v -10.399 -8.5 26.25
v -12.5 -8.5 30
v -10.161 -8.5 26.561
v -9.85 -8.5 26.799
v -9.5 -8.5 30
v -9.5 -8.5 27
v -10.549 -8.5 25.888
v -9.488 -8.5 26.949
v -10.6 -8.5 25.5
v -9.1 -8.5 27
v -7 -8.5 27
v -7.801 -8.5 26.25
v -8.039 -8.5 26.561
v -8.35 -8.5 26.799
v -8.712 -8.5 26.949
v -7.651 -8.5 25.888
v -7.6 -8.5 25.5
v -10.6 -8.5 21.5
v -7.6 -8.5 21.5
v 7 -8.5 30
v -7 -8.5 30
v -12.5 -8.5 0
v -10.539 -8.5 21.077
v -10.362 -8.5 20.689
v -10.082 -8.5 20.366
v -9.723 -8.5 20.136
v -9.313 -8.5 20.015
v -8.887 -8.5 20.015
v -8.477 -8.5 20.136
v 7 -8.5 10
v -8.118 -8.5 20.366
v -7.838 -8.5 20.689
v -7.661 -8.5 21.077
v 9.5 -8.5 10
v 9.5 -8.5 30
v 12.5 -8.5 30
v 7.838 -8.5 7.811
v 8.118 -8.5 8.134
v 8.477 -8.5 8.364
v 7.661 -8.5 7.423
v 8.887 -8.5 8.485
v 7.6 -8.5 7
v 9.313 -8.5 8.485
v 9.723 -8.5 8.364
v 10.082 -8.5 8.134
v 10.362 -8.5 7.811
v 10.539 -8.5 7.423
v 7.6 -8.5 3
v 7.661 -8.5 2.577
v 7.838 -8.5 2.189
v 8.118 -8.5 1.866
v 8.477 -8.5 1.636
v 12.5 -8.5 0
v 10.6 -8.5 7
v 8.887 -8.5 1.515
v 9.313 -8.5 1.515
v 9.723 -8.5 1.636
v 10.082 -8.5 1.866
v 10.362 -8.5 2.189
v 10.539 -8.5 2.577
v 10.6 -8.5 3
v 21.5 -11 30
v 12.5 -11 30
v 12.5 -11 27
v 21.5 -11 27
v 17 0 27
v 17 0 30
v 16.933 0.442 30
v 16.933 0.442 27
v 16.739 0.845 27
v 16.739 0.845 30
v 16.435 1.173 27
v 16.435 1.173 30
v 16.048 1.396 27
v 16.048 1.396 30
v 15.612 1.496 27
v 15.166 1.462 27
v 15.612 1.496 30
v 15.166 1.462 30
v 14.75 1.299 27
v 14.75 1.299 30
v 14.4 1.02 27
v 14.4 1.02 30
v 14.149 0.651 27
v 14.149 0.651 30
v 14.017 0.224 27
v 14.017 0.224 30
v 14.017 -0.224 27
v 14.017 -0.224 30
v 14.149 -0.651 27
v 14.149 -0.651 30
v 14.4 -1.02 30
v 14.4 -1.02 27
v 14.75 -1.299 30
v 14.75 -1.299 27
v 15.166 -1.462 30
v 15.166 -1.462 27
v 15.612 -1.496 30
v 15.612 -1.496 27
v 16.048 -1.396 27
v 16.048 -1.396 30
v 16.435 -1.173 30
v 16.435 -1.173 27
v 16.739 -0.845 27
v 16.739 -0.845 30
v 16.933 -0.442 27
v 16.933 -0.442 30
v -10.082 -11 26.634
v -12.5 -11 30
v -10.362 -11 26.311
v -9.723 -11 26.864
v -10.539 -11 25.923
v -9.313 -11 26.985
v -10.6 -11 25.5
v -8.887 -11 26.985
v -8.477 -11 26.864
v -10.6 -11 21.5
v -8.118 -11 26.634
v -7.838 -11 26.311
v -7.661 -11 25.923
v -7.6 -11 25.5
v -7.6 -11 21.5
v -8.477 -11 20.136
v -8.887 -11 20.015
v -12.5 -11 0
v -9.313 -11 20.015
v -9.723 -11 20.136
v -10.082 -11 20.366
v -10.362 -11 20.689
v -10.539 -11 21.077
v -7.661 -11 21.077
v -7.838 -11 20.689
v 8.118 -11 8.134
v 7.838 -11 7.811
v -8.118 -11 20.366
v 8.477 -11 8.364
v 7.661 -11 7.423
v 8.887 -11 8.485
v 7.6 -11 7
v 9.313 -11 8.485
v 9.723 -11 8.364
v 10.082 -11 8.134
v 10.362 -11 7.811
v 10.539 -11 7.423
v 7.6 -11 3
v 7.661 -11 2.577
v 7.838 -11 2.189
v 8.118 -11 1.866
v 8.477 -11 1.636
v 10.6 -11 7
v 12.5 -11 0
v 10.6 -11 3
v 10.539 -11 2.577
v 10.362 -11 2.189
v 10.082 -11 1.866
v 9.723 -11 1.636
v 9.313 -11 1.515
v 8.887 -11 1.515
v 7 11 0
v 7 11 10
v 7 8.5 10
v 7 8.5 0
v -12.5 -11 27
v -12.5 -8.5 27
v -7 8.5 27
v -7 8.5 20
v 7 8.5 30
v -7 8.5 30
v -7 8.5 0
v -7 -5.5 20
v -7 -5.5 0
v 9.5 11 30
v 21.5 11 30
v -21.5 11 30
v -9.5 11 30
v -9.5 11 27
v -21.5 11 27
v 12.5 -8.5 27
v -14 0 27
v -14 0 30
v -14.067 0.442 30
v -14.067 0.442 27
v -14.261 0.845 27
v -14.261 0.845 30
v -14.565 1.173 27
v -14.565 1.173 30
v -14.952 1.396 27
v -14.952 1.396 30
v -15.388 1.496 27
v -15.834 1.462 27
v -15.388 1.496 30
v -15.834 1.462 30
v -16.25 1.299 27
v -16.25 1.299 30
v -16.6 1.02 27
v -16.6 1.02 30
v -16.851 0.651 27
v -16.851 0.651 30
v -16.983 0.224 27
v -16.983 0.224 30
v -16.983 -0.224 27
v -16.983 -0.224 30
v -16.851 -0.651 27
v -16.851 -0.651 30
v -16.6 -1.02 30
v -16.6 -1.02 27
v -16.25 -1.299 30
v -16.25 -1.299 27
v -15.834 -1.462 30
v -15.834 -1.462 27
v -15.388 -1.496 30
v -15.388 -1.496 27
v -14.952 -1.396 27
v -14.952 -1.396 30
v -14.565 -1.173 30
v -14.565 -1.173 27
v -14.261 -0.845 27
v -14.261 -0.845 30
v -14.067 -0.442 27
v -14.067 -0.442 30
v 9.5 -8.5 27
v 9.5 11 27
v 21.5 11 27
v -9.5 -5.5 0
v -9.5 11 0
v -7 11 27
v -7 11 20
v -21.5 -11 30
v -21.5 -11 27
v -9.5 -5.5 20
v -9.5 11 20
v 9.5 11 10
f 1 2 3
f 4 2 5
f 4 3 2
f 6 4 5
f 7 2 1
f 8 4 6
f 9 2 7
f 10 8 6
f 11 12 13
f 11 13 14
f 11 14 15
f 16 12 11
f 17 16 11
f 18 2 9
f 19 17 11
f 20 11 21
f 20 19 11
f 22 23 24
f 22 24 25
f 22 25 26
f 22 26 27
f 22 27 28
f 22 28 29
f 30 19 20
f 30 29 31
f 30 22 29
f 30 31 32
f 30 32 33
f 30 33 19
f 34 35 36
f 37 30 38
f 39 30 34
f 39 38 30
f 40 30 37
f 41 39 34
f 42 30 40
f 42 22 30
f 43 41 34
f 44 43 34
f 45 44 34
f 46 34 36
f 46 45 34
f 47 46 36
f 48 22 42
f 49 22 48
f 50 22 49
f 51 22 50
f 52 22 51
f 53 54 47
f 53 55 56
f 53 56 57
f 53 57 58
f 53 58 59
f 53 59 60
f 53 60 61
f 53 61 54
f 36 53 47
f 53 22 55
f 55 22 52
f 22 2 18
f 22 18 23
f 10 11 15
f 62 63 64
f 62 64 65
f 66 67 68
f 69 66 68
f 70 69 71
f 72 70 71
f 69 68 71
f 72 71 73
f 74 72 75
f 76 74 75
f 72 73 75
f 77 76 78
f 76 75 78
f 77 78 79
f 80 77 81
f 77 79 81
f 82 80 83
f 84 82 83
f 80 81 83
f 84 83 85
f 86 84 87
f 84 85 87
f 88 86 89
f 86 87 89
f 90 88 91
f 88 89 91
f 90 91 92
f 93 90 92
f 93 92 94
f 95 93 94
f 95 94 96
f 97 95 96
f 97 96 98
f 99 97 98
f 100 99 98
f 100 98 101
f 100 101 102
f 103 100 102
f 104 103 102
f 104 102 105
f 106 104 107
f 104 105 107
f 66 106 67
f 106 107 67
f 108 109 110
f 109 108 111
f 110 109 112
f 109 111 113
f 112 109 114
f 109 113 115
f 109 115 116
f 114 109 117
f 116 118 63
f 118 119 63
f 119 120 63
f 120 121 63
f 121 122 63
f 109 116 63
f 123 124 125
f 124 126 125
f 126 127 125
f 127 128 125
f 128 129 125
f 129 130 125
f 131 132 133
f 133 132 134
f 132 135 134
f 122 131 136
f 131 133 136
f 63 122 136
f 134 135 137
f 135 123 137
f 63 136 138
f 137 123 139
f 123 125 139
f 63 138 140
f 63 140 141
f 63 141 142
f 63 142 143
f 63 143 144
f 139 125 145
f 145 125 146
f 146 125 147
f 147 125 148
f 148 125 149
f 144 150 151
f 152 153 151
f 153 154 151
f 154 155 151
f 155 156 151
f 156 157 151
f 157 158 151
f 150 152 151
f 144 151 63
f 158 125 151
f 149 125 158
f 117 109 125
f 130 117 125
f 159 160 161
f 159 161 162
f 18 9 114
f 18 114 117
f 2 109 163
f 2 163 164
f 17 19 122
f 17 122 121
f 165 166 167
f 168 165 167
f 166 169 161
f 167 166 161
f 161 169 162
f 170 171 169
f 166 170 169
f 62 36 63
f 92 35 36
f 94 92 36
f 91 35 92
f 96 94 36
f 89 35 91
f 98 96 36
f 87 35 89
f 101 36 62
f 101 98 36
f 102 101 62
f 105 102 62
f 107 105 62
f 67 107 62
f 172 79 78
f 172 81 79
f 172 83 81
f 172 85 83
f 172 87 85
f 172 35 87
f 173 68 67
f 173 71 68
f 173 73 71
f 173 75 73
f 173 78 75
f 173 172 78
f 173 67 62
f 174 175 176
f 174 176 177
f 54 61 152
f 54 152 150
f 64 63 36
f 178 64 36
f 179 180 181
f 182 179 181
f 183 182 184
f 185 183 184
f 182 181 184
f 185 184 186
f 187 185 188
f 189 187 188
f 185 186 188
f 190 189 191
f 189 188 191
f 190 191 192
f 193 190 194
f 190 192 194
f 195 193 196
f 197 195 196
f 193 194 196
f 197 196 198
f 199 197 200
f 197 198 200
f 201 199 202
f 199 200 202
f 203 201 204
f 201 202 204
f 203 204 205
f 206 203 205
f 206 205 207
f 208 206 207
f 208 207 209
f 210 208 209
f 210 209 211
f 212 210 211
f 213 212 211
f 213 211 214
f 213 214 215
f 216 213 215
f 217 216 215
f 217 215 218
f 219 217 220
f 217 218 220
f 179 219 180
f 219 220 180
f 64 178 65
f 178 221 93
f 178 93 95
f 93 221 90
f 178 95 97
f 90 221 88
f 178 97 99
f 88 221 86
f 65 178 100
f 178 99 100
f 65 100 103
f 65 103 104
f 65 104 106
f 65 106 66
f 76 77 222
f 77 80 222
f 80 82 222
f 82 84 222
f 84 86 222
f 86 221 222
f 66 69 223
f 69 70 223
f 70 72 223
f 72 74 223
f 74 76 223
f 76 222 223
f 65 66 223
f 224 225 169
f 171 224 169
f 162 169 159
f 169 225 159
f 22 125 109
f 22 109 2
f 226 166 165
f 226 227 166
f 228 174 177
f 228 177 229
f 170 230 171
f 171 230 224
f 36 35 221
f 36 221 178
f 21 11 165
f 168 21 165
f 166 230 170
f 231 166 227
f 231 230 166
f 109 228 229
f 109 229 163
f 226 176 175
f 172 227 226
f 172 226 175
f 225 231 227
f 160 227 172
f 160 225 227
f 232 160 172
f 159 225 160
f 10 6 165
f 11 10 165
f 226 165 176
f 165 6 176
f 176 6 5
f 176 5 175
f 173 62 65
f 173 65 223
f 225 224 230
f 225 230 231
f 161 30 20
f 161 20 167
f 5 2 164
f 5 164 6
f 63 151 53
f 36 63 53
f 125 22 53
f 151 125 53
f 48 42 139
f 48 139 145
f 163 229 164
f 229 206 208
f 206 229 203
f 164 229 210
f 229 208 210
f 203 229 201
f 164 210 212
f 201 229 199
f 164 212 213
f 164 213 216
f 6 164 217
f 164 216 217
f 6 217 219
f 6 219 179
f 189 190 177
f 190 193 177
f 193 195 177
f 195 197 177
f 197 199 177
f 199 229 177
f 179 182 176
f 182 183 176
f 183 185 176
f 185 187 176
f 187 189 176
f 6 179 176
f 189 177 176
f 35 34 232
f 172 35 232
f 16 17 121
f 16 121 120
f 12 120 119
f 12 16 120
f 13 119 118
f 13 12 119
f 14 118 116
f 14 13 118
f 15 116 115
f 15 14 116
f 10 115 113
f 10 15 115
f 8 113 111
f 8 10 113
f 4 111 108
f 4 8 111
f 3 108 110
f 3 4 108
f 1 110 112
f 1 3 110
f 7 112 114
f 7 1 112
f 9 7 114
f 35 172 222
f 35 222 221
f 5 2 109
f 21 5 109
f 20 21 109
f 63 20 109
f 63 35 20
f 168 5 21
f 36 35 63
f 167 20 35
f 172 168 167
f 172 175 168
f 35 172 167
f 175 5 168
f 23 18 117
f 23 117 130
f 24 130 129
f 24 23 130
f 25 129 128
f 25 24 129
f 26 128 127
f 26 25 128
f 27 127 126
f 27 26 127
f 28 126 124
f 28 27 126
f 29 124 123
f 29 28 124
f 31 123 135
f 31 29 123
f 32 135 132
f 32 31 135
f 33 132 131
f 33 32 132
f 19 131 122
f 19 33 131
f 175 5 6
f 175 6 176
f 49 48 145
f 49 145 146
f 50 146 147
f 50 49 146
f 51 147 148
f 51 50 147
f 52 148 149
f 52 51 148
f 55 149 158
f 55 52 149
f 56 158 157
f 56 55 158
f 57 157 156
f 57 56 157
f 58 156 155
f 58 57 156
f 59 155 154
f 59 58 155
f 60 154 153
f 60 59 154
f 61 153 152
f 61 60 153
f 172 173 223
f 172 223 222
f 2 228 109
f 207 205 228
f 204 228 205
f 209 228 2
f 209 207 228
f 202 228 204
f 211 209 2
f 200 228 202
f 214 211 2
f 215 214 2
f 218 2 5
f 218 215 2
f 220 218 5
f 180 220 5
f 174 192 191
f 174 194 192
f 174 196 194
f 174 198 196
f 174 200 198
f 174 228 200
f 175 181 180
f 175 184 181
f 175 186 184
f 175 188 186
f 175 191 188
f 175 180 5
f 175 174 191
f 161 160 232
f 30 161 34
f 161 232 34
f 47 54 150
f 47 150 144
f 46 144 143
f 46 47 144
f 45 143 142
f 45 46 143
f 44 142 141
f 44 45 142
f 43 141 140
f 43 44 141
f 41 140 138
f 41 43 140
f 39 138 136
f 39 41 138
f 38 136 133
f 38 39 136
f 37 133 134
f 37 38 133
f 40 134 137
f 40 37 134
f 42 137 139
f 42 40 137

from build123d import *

# Parameters (mm, degrees)
SKETCH1_W           = 19
SKETCH1_H           = 22
SKETCH1_W_2         = 14
SKETCH1_H_2         = 17
SKETCH1_W_3         = 3
SKETCH1_H_3         = 2.5
BOSS_EXTRUDE1_DEPTH = 30
SKETCH2_W           = 7
SKETCH2_H           = 16.5
CUT_EXTRUDE1_DEPTH  = 2.5
SKETCH3_W           = 10
SKETCH3_H           = 16.5
SKETCH3_H_2         = 3
CUT_EXTRUDE2_DEPTH  = 2.5
CUT_EXTRUDE3_DEPTH  = 38.901187316
SKETCH6_R           = 1.5
SKETCH6_W           = 9
SKETCH6_H           = 2.5
BOSS_EXTRUDE2_DEPTH = 3


with BuildPart() as part:
    # Sketch1 → Boss-Extrude1 (new body)
    # profile 1 of 3: a face of its own
    with BuildSketch(Plane.XY):
        Rectangle(SKETCH1_W, SKETCH1_H)
        Rectangle(SKETCH1_W_2, SKETCH1_H_2, mode=Mode.SUBTRACT)
    # profile 2 of 3: a face of its own
    with BuildSketch(Plane.XY):
        with Locations((-11, -9.75)):
            Rectangle(SKETCH1_W_3, SKETCH1_H_3)
    # profile 3 of 3: a face of its own
    with BuildSketch(Plane.XY):
        with Locations((11, -9.75)):
            Rectangle(SKETCH1_W_3, SKETCH1_H_3)
    extrude(amount=BOSS_EXTRUDE1_DEPTH)

    # Sketch2 → Cut-Extrude1 (cut)
    with BuildSketch(Plane.ZY.offset(9.5)):
        Polygon((27.000006, -8.5), (27.000006, -5.5), (20.000006, -5.5), (0, -5.5), (0, -8.5), align=None)
        with Locations((23.500006, 2.75)):
            Rectangle(SKETCH2_W, SKETCH2_H)
    extrude(amount=-CUT_EXTRUDE1_DEPTH, mode=Mode.SUBTRACT)

    # Sketch3 → Cut-Extrude2 (cut)
    with BuildSketch(Plane(origin=(9.5, 0, 0), x_dir=(0, 0, -1), z_dir=(1, 0, 0))):
        with Locations((-5, 2.75)):
            Rectangle(SKETCH3_W, SKETCH3_H)
        with Locations((-5, -7)):
            Rectangle(SKETCH3_W, SKETCH3_H_2)
    extrude(amount=-CUT_EXTRUDE2_DEPTH, mode=Mode.SUBTRACT)

    # Sketch5 → Cut-Extrude3 (cut, through all)
    with BuildSketch(Plane(origin=(0, -8.5, 0), x_dir=(1, 0, 0), z_dir=(0, 1, 0))):
        with BuildLine():
            Line((-10.6, -25.500006), (-10.6, -21.500006))
            ThreePointArc((-10.6, -21.500006), (-9.1, -20.000006), (-7.6, -21.500006))
            Line((-7.6, -21.500006), (-7.6, -25.500006))
            ThreePointArc((-7.6, -25.500006), (-9.1, -27.000006), (-10.6, -25.500006))
        make_face()
        with BuildLine():
            Line((7.6, -7), (7.6, -3))
            ThreePointArc((7.6, -3), (9.1, -1.5), (10.6, -3))
            Line((10.6, -3), (10.6, -7))
            ThreePointArc((10.6, -7), (9.1, -8.5), (7.6, -7))
        make_face()
    extrude(amount=-CUT_EXTRUDE3_DEPTH, mode=Mode.SUBTRACT)


with BuildPart() as body_2:
    # Sketch6 → Boss-Extrude2 (new body)
    # profile 1 of 4: a face of its own
    with BuildSketch(Plane.XY.offset(30)):
        Polygon((-9.5, -8.5), (-9.5, 11), (-21.5, 11), (-21.5, -8.5), (-12.5, -8.5), align=None)
        with Locations((-15.5, 0)):
            Circle(SKETCH6_R, mode=Mode.SUBTRACT)
    # profile 2 of 4: a face of its own
    with BuildSketch(Plane.XY.offset(30)):
        with Locations((-17, -9.75)):
            Rectangle(SKETCH6_W, SKETCH6_H)
    # profile 3 of 4: a face of its own
    with BuildSketch(Plane.XY.offset(30)):
        with Locations((17, -9.75)):
            Rectangle(SKETCH6_W, SKETCH6_H)
    # profile 4 of 4: a face of its own
    with BuildSketch(Plane.XY.offset(30)):
        Polygon((21.5, 11), (9.5, 11), (9.5, -8.5), (12.5, -8.5), (21.5, -8.5), align=None)
        with Locations((15.5, 0)):
            Circle(SKETCH6_R, mode=Mode.SUBTRACT)
    extrude(amount=-BOSS_EXTRUDE2_DEPTH)


solid = Compound([part.part, body_2.part])
